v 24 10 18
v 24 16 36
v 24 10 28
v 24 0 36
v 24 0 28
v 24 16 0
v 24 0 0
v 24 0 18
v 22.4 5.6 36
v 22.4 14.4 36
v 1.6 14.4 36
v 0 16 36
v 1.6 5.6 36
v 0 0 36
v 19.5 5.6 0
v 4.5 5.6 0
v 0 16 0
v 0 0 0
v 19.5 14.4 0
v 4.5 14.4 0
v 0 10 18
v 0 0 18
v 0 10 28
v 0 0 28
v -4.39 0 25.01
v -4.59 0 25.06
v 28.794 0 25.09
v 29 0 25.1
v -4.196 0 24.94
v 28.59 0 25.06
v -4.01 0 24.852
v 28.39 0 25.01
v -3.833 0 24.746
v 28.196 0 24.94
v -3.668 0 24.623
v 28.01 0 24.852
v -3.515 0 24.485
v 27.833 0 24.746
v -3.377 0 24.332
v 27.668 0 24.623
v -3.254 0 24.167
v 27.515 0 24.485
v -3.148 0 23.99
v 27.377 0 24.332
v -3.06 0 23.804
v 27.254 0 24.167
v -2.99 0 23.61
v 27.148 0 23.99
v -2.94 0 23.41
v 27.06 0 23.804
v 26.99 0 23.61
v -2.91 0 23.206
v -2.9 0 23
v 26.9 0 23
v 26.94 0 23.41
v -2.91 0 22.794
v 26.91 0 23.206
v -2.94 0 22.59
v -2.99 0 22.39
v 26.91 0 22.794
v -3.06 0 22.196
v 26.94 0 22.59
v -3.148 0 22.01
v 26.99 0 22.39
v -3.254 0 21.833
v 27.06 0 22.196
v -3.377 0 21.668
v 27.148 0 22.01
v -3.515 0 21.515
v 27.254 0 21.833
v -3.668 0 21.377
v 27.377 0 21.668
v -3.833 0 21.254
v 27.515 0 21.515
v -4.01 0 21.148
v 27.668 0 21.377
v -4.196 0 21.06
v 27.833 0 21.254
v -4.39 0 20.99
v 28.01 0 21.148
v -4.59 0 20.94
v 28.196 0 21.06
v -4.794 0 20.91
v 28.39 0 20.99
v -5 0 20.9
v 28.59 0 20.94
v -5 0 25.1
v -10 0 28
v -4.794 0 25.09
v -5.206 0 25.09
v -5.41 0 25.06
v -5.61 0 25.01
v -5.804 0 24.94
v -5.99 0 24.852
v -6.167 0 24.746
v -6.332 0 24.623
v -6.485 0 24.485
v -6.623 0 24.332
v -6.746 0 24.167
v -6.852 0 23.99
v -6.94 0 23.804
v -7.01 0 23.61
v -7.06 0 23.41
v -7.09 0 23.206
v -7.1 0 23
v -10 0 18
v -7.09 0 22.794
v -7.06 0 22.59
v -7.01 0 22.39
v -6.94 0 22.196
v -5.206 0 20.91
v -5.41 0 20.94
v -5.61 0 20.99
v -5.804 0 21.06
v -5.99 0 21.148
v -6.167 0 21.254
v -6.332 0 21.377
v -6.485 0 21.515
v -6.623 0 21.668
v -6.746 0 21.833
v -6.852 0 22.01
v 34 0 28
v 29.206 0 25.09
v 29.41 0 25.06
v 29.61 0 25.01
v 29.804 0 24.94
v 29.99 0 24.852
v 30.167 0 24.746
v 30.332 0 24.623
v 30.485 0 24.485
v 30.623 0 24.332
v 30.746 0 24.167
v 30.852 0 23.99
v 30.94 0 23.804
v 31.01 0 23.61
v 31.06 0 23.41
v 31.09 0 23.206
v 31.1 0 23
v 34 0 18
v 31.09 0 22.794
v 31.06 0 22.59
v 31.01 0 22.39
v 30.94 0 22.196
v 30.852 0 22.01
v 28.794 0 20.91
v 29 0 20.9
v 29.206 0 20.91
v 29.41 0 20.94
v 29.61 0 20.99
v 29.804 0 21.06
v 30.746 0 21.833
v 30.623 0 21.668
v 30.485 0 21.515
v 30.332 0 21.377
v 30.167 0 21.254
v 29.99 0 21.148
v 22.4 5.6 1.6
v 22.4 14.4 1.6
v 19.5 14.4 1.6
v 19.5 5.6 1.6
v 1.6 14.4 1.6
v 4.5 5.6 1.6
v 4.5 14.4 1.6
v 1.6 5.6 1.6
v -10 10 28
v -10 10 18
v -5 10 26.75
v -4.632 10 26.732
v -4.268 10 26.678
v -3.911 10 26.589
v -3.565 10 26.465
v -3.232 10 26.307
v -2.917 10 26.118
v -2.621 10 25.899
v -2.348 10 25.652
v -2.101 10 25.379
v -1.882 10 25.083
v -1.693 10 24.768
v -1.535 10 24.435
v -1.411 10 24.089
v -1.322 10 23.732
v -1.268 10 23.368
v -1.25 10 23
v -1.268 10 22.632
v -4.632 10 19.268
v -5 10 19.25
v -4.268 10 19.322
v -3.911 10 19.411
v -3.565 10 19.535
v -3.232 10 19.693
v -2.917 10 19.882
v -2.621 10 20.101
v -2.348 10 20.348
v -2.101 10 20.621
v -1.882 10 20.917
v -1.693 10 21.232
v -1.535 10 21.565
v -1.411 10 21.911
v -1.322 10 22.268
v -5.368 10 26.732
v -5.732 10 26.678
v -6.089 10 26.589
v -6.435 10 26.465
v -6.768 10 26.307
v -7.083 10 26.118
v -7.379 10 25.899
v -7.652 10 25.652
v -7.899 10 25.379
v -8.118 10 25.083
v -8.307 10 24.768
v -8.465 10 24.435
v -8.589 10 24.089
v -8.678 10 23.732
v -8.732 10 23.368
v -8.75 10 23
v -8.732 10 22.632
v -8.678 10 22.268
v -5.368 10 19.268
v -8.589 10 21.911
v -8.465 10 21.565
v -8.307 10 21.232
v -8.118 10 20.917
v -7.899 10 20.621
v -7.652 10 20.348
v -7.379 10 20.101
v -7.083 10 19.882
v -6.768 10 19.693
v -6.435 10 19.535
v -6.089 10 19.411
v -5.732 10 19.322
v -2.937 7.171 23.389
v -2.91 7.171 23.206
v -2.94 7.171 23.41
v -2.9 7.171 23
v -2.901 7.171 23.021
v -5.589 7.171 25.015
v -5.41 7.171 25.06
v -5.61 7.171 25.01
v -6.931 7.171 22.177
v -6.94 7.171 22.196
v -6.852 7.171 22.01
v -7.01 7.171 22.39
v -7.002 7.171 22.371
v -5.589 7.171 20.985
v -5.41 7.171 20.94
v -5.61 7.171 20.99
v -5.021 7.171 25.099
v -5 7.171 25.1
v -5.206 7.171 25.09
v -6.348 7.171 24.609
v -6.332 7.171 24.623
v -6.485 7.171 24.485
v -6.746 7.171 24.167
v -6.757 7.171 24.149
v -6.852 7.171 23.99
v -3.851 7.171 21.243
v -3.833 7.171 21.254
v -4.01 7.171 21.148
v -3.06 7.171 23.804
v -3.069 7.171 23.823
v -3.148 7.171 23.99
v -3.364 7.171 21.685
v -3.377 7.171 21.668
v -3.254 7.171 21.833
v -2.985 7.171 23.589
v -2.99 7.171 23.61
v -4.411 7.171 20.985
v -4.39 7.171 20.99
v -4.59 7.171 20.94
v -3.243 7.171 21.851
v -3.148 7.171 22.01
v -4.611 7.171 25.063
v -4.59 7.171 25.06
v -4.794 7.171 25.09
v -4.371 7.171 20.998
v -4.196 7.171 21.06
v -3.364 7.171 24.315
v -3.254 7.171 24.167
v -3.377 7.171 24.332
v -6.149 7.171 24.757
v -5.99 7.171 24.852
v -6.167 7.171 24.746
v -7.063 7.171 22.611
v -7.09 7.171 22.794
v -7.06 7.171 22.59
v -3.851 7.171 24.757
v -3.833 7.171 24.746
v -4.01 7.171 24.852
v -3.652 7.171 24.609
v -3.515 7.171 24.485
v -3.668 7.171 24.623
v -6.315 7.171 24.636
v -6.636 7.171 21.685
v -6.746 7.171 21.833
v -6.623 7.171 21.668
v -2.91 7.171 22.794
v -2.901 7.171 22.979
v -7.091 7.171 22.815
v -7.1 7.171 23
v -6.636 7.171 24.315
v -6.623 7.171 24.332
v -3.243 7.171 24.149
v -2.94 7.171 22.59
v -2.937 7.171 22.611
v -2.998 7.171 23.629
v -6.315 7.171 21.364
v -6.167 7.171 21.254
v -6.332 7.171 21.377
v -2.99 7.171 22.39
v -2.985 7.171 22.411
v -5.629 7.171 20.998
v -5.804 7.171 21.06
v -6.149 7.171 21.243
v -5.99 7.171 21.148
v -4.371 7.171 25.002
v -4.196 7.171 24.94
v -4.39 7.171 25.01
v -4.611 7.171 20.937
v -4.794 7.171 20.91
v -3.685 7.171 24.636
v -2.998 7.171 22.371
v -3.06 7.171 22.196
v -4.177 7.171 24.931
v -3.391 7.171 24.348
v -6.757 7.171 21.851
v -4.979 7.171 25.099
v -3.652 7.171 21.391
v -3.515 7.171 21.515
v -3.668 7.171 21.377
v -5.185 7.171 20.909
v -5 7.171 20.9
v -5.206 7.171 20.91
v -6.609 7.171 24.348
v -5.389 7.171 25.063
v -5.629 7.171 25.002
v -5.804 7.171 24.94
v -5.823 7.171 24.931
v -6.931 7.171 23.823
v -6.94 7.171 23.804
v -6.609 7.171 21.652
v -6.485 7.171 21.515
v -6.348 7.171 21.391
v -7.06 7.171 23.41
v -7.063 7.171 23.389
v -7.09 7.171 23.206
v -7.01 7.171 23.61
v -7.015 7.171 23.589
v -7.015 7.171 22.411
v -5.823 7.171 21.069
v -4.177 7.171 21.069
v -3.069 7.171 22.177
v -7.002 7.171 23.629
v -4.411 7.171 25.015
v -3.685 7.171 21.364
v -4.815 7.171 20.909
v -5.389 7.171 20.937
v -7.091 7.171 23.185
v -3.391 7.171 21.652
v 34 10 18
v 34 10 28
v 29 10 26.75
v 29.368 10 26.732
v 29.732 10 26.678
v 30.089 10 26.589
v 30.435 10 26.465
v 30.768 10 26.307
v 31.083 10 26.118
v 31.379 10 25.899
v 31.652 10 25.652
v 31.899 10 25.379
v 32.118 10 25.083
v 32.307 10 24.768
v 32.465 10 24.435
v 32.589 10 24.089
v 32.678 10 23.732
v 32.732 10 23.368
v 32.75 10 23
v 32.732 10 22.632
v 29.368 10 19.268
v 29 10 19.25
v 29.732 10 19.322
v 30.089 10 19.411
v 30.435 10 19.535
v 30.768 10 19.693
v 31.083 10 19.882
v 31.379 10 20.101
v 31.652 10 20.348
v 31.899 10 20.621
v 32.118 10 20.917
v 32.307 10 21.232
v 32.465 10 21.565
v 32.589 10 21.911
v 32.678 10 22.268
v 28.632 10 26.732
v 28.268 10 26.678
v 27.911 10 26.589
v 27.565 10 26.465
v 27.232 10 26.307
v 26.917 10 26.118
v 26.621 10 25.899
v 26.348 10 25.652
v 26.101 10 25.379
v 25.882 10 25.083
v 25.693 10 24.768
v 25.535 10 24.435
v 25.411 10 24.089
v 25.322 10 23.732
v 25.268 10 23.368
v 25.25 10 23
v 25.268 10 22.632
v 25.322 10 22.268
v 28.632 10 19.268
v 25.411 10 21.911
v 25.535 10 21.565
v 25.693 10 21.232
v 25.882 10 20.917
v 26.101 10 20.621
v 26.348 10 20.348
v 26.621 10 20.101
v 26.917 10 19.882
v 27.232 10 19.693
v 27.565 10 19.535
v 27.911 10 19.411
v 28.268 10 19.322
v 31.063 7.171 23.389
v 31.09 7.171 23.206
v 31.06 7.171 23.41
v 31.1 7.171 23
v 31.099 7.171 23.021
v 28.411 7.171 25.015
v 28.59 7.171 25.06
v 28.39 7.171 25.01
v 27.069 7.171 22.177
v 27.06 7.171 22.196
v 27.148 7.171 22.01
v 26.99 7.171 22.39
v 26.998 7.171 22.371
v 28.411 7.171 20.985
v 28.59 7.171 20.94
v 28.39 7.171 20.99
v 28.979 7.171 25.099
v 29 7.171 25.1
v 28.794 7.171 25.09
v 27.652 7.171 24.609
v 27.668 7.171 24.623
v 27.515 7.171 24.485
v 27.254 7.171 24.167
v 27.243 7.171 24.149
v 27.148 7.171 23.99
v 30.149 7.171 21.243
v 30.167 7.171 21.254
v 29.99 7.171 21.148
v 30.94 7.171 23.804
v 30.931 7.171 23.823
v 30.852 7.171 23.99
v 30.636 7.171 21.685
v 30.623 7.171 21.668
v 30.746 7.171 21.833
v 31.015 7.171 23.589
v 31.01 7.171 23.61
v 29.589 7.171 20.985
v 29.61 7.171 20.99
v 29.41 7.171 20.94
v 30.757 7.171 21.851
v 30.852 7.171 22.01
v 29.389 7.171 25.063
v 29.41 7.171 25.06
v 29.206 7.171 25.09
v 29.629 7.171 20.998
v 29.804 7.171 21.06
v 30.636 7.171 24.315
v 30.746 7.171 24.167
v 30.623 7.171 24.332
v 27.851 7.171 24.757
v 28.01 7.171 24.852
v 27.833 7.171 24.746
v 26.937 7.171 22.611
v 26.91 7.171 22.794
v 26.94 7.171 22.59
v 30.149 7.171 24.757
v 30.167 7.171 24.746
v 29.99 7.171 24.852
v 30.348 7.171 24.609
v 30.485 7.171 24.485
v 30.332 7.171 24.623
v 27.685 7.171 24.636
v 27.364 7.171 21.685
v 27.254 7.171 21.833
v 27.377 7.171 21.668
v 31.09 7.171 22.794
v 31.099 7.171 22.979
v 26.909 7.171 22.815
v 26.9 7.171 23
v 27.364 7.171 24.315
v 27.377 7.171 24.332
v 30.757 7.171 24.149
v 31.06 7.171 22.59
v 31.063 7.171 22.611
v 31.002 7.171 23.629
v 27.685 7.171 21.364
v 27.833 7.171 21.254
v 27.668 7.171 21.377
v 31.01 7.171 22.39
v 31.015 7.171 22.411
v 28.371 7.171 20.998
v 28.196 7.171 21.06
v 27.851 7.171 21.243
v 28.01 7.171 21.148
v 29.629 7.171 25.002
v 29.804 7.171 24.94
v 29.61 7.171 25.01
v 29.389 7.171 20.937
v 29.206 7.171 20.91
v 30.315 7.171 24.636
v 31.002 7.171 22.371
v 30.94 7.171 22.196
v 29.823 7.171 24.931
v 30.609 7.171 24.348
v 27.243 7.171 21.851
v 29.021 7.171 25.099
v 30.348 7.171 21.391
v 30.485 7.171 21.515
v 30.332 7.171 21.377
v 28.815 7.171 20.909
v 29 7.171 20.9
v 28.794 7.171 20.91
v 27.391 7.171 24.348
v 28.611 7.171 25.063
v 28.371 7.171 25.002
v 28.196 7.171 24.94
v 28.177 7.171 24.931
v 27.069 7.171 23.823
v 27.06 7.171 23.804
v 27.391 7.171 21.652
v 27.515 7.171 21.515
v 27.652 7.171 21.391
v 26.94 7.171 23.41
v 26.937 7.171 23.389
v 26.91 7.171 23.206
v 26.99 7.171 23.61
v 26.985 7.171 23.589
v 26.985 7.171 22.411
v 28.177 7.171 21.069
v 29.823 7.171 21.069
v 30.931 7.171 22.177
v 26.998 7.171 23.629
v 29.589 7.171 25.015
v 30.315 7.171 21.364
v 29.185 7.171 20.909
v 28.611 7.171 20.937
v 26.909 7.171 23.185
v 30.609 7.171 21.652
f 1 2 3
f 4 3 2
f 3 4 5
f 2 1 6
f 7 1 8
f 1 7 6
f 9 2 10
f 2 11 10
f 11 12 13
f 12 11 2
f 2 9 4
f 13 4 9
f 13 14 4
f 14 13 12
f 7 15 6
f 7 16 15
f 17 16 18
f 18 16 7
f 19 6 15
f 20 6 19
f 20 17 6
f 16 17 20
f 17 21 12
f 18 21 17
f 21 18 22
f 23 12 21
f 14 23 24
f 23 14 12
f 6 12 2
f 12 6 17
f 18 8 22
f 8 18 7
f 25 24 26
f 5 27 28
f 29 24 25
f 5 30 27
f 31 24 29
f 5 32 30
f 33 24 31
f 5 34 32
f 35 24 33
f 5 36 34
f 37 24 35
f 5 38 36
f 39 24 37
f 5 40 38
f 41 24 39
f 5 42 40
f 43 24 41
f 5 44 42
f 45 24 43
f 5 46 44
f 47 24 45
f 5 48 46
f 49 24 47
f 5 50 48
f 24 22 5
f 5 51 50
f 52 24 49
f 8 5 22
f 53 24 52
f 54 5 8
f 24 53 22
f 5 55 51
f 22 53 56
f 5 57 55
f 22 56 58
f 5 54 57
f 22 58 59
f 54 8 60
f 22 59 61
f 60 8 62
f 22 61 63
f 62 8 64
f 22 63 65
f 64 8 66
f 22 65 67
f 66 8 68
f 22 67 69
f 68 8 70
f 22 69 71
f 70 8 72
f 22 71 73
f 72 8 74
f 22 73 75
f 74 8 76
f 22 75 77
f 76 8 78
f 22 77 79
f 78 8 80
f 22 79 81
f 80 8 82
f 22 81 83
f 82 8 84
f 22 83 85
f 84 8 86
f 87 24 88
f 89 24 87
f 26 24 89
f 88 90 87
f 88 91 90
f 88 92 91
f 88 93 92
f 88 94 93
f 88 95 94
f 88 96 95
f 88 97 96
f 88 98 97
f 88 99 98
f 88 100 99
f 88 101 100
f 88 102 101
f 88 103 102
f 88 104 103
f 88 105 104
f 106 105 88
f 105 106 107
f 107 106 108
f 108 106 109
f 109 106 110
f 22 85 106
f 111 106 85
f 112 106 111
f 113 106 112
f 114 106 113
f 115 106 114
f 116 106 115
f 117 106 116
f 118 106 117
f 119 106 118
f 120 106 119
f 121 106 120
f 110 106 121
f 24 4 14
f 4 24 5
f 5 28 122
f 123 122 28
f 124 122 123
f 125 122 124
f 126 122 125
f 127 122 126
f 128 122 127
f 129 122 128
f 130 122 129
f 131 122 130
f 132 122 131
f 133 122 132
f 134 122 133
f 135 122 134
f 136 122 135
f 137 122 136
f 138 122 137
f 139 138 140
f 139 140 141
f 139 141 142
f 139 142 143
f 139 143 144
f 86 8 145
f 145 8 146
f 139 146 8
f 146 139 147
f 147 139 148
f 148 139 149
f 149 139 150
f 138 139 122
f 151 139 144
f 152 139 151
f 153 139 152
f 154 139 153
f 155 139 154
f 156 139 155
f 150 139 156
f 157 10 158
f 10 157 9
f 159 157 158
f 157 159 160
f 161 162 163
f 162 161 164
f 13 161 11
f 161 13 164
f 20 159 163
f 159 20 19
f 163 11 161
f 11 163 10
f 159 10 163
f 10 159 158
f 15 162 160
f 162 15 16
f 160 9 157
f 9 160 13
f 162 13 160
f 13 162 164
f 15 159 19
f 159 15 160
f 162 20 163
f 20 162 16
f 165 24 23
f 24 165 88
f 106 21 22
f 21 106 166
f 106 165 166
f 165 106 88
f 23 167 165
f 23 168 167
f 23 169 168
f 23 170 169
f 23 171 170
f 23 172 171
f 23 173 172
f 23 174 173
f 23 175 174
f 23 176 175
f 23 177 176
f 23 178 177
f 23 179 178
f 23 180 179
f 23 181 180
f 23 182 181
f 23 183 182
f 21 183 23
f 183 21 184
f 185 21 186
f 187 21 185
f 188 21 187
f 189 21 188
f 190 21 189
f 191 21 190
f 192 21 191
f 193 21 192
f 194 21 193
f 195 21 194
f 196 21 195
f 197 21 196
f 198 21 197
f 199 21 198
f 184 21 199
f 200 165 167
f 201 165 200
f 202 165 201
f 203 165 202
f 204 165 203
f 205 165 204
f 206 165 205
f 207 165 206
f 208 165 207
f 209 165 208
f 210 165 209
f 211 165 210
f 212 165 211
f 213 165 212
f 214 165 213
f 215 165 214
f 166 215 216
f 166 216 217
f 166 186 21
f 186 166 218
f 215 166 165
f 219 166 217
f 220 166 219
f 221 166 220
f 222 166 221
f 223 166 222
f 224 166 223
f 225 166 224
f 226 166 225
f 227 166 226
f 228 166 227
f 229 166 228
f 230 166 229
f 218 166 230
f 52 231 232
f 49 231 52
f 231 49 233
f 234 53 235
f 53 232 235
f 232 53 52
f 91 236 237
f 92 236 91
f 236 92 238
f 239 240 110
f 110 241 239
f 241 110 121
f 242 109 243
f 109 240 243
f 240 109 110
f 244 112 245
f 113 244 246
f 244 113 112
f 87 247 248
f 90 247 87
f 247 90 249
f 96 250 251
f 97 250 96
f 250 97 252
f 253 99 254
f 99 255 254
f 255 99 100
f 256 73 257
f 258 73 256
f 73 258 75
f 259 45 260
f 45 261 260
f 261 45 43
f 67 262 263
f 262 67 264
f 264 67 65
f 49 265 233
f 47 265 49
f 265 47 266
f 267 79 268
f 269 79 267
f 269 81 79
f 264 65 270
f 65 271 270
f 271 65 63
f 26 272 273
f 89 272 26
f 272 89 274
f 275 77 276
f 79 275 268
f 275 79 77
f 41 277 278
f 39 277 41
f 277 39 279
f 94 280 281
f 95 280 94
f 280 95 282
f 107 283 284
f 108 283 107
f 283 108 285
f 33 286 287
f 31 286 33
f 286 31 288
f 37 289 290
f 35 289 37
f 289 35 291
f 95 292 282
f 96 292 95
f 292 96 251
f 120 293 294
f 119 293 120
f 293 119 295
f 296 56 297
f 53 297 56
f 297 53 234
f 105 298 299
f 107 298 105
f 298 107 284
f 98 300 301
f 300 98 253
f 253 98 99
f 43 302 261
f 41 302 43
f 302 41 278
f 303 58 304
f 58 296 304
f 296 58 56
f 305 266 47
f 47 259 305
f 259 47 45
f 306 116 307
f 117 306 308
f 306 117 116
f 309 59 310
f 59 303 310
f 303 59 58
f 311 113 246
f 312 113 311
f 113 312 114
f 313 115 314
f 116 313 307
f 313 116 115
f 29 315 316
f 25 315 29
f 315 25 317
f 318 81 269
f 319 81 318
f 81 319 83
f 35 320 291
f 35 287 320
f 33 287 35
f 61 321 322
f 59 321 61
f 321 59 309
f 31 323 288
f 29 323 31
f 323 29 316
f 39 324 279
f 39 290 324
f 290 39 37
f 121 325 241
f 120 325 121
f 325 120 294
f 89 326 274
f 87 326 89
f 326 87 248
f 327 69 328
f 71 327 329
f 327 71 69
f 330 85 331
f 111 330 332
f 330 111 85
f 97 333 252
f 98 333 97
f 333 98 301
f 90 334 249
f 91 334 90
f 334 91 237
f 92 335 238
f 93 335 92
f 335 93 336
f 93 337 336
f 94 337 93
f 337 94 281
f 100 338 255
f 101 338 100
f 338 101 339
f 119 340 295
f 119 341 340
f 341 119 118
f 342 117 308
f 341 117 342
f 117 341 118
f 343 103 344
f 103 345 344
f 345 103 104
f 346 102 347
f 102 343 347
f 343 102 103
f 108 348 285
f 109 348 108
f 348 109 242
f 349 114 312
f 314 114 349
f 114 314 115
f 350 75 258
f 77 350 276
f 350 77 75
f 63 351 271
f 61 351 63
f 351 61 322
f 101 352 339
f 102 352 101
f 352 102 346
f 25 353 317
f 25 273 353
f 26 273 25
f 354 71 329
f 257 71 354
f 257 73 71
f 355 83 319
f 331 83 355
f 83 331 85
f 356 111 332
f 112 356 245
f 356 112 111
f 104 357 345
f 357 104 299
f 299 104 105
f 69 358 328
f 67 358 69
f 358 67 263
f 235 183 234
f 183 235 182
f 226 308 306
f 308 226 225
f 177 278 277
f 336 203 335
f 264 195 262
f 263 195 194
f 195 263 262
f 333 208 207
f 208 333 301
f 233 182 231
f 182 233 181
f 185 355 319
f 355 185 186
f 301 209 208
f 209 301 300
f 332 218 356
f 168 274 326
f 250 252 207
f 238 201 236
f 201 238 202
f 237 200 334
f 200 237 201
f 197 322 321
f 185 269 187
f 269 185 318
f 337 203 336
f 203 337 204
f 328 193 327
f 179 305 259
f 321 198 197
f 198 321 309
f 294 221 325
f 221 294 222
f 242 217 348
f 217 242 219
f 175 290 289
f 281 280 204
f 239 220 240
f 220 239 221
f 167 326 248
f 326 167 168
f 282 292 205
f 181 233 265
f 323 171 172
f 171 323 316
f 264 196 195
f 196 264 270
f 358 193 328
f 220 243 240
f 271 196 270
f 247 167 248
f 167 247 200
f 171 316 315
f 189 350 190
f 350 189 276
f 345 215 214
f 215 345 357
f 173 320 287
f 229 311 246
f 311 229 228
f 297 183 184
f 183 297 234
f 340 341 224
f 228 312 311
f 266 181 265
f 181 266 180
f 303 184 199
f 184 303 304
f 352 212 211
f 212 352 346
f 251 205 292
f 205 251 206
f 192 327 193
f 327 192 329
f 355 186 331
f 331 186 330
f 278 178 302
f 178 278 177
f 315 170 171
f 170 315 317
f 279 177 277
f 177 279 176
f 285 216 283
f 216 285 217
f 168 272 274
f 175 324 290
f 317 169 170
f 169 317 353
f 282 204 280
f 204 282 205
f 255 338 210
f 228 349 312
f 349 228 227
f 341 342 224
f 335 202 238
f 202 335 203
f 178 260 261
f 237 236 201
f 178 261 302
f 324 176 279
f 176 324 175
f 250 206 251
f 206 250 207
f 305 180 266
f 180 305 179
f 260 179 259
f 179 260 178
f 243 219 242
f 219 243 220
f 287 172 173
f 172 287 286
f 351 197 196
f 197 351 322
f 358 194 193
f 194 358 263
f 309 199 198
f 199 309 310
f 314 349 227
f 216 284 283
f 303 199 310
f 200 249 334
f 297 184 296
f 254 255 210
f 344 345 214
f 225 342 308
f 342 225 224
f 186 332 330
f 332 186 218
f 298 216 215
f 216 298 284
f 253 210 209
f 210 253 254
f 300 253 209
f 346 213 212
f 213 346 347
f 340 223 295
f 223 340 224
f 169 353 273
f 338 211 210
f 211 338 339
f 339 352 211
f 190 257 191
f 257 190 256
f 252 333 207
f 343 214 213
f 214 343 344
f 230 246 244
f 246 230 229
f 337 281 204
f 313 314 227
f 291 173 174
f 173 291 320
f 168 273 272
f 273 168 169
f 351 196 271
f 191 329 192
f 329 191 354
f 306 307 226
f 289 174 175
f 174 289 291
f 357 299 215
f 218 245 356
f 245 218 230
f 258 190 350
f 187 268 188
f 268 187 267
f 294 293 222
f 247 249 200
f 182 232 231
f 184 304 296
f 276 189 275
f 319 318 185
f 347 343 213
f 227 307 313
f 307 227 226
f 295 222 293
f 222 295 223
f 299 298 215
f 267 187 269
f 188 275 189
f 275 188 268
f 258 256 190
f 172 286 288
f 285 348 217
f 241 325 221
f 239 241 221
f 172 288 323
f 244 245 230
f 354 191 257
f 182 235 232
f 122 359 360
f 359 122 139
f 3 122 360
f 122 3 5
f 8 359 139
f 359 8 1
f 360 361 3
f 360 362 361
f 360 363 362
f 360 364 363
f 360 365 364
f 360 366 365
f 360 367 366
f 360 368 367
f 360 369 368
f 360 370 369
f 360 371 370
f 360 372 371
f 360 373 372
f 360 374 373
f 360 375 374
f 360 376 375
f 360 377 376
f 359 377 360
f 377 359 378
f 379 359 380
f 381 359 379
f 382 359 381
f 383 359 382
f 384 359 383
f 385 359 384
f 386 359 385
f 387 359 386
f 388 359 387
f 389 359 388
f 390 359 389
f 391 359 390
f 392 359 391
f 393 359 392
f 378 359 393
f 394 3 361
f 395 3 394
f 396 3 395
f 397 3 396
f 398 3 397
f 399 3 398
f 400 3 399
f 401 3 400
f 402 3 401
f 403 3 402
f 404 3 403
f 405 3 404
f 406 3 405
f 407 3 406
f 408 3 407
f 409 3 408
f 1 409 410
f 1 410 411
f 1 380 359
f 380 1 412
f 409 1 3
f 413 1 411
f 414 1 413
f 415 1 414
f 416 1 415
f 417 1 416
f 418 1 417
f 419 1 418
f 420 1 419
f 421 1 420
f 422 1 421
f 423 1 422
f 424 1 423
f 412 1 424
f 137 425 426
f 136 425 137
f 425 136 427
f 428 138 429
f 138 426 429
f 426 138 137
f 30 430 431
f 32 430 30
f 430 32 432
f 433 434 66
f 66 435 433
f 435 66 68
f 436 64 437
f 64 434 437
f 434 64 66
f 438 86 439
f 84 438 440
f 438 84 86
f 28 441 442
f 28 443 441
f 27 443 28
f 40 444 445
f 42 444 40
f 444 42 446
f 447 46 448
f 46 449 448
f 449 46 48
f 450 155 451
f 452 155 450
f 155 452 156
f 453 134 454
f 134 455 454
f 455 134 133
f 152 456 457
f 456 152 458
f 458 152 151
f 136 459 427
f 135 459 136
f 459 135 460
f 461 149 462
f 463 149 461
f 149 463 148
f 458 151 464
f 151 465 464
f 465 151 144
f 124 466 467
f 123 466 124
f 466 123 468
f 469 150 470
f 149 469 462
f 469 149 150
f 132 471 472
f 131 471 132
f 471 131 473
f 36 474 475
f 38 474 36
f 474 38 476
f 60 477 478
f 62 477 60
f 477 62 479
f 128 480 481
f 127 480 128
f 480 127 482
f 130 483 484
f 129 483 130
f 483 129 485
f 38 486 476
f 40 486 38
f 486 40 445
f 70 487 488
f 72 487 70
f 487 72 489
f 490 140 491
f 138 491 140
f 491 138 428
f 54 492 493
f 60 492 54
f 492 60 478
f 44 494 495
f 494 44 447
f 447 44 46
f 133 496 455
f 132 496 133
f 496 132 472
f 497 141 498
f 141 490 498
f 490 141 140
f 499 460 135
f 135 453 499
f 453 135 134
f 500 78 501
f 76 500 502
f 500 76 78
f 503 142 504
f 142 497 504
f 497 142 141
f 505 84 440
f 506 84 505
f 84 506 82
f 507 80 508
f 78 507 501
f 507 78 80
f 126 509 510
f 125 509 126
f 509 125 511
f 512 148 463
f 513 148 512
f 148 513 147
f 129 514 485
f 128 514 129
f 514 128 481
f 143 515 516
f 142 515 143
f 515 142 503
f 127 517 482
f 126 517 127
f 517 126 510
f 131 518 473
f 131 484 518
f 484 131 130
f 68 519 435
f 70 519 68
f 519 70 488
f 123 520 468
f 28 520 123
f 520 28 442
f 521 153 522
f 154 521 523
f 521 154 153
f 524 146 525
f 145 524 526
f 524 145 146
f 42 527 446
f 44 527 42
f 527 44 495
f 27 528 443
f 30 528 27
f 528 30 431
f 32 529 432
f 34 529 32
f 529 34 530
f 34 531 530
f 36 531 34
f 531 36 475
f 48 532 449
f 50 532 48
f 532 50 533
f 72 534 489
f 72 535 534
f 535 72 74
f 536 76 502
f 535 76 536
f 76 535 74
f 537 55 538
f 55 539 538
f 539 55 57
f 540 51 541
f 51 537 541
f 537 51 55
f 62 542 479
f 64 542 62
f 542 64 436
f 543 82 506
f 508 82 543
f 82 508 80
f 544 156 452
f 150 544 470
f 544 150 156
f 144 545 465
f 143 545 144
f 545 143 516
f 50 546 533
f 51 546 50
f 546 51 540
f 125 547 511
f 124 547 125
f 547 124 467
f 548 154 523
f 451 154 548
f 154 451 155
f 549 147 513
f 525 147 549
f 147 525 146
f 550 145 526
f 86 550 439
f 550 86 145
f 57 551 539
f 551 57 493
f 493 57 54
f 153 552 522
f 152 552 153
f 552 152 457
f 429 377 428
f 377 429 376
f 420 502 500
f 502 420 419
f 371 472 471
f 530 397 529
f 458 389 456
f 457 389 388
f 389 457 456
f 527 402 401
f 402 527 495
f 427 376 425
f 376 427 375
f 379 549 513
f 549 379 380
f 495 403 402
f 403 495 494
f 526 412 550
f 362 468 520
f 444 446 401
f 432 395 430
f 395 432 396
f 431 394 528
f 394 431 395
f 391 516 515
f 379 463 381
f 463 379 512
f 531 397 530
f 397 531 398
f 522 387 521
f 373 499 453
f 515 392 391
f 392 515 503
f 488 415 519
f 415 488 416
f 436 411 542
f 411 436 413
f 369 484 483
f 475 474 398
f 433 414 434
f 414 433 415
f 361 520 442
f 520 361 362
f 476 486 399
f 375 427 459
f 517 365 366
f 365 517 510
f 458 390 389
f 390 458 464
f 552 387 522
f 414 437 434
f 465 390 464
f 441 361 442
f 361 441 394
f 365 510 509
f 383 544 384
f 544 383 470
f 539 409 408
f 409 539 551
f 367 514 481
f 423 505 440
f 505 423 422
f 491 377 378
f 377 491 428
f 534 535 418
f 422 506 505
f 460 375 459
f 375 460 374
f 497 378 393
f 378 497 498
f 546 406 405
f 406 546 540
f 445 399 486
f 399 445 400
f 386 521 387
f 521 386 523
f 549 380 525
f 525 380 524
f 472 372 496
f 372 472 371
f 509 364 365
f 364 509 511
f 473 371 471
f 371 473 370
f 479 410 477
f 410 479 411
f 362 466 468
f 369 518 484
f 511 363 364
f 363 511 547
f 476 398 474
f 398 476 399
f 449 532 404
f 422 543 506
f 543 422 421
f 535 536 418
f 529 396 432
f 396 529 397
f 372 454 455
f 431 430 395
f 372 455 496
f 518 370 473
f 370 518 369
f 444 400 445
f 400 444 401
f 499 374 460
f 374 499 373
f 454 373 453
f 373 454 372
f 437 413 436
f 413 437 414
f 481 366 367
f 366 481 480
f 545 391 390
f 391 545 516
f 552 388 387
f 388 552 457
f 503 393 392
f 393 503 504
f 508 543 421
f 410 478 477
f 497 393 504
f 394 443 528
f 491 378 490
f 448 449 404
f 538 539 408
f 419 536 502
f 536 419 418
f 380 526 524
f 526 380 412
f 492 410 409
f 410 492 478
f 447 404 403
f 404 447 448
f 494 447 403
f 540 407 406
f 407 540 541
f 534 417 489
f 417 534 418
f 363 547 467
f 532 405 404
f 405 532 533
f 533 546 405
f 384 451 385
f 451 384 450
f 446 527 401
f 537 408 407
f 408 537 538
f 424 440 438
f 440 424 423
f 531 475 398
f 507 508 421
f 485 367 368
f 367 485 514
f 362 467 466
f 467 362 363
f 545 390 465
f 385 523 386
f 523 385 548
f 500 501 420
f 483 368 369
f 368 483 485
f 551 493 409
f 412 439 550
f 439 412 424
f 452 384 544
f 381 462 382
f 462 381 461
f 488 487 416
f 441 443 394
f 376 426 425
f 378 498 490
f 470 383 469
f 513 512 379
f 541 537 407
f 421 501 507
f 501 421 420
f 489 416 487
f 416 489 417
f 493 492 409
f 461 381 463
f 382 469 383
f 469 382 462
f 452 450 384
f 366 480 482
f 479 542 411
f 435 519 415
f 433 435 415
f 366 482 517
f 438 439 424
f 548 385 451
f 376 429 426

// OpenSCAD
wallThickness = 1.6;

/* hidden */

wt = wallThickness;
dwt = 2*wallThickness;

module holderSnipeNosePliers() {
    difference() {
        cube([24, 16, 36]);
        translate([wt, wt+4, wt]) cube([24-dwt, 12-dwt, 36]);
        translate([(24-15)/2, wt+4, 0]) cube([15, 12-dwt, wt]);
    }
    translate([-10, 0, 18]) screwBlock();
    translate([24, 0, 18]) screwBlock();
}

module holderLargeWirecutters() {
    difference() {
        cube([22, 18, 37]);
        translate([wallThickness, 6, wallThickness]) cube([22-2*wallThickness, 18 - 6 - wallThickness, 37]);
    }
    translate([-10, 0, 18]) screwBlock();
    translate([22, 0, 18]) screwBlock();
}

module screwBlock() {
    $fn = 64;
    difference() {
        cube([10, 10, 10]);
        translate([5, 10, 5]) rotate([90, 0, 0]) cylinder(d=4.2, h=10);
        translate([5, 10, 5]) rotate([90, 0, 0]) cylinder(d=7.5, d2=4, h=3);
    }
    
    
}

translate([0, 0, 0])    holderSnipeNosePliers();
//translate([50, 0, 0])   holderLargeWirecutters();
